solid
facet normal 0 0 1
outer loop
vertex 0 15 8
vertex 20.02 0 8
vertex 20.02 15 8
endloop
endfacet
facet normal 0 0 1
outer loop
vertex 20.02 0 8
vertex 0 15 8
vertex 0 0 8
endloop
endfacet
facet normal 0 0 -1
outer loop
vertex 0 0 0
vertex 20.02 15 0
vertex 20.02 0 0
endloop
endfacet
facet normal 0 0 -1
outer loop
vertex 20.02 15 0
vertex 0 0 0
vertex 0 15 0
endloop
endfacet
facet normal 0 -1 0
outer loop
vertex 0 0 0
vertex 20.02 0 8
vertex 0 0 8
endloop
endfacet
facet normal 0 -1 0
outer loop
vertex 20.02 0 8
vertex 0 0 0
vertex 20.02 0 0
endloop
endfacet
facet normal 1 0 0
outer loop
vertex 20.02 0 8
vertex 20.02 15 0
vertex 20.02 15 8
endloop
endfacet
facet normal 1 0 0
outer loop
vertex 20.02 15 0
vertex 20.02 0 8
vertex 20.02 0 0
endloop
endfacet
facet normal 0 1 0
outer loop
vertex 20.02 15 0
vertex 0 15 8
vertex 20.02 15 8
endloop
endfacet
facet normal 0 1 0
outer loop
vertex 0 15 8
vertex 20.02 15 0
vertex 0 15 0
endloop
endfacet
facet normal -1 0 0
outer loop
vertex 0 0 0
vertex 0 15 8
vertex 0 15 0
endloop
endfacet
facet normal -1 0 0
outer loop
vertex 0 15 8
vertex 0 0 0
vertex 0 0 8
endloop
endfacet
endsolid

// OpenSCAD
use <library-catalog.scad>
assert(value_1999(3)==2002);
cube([value_1999(3)/100,15,8]);
